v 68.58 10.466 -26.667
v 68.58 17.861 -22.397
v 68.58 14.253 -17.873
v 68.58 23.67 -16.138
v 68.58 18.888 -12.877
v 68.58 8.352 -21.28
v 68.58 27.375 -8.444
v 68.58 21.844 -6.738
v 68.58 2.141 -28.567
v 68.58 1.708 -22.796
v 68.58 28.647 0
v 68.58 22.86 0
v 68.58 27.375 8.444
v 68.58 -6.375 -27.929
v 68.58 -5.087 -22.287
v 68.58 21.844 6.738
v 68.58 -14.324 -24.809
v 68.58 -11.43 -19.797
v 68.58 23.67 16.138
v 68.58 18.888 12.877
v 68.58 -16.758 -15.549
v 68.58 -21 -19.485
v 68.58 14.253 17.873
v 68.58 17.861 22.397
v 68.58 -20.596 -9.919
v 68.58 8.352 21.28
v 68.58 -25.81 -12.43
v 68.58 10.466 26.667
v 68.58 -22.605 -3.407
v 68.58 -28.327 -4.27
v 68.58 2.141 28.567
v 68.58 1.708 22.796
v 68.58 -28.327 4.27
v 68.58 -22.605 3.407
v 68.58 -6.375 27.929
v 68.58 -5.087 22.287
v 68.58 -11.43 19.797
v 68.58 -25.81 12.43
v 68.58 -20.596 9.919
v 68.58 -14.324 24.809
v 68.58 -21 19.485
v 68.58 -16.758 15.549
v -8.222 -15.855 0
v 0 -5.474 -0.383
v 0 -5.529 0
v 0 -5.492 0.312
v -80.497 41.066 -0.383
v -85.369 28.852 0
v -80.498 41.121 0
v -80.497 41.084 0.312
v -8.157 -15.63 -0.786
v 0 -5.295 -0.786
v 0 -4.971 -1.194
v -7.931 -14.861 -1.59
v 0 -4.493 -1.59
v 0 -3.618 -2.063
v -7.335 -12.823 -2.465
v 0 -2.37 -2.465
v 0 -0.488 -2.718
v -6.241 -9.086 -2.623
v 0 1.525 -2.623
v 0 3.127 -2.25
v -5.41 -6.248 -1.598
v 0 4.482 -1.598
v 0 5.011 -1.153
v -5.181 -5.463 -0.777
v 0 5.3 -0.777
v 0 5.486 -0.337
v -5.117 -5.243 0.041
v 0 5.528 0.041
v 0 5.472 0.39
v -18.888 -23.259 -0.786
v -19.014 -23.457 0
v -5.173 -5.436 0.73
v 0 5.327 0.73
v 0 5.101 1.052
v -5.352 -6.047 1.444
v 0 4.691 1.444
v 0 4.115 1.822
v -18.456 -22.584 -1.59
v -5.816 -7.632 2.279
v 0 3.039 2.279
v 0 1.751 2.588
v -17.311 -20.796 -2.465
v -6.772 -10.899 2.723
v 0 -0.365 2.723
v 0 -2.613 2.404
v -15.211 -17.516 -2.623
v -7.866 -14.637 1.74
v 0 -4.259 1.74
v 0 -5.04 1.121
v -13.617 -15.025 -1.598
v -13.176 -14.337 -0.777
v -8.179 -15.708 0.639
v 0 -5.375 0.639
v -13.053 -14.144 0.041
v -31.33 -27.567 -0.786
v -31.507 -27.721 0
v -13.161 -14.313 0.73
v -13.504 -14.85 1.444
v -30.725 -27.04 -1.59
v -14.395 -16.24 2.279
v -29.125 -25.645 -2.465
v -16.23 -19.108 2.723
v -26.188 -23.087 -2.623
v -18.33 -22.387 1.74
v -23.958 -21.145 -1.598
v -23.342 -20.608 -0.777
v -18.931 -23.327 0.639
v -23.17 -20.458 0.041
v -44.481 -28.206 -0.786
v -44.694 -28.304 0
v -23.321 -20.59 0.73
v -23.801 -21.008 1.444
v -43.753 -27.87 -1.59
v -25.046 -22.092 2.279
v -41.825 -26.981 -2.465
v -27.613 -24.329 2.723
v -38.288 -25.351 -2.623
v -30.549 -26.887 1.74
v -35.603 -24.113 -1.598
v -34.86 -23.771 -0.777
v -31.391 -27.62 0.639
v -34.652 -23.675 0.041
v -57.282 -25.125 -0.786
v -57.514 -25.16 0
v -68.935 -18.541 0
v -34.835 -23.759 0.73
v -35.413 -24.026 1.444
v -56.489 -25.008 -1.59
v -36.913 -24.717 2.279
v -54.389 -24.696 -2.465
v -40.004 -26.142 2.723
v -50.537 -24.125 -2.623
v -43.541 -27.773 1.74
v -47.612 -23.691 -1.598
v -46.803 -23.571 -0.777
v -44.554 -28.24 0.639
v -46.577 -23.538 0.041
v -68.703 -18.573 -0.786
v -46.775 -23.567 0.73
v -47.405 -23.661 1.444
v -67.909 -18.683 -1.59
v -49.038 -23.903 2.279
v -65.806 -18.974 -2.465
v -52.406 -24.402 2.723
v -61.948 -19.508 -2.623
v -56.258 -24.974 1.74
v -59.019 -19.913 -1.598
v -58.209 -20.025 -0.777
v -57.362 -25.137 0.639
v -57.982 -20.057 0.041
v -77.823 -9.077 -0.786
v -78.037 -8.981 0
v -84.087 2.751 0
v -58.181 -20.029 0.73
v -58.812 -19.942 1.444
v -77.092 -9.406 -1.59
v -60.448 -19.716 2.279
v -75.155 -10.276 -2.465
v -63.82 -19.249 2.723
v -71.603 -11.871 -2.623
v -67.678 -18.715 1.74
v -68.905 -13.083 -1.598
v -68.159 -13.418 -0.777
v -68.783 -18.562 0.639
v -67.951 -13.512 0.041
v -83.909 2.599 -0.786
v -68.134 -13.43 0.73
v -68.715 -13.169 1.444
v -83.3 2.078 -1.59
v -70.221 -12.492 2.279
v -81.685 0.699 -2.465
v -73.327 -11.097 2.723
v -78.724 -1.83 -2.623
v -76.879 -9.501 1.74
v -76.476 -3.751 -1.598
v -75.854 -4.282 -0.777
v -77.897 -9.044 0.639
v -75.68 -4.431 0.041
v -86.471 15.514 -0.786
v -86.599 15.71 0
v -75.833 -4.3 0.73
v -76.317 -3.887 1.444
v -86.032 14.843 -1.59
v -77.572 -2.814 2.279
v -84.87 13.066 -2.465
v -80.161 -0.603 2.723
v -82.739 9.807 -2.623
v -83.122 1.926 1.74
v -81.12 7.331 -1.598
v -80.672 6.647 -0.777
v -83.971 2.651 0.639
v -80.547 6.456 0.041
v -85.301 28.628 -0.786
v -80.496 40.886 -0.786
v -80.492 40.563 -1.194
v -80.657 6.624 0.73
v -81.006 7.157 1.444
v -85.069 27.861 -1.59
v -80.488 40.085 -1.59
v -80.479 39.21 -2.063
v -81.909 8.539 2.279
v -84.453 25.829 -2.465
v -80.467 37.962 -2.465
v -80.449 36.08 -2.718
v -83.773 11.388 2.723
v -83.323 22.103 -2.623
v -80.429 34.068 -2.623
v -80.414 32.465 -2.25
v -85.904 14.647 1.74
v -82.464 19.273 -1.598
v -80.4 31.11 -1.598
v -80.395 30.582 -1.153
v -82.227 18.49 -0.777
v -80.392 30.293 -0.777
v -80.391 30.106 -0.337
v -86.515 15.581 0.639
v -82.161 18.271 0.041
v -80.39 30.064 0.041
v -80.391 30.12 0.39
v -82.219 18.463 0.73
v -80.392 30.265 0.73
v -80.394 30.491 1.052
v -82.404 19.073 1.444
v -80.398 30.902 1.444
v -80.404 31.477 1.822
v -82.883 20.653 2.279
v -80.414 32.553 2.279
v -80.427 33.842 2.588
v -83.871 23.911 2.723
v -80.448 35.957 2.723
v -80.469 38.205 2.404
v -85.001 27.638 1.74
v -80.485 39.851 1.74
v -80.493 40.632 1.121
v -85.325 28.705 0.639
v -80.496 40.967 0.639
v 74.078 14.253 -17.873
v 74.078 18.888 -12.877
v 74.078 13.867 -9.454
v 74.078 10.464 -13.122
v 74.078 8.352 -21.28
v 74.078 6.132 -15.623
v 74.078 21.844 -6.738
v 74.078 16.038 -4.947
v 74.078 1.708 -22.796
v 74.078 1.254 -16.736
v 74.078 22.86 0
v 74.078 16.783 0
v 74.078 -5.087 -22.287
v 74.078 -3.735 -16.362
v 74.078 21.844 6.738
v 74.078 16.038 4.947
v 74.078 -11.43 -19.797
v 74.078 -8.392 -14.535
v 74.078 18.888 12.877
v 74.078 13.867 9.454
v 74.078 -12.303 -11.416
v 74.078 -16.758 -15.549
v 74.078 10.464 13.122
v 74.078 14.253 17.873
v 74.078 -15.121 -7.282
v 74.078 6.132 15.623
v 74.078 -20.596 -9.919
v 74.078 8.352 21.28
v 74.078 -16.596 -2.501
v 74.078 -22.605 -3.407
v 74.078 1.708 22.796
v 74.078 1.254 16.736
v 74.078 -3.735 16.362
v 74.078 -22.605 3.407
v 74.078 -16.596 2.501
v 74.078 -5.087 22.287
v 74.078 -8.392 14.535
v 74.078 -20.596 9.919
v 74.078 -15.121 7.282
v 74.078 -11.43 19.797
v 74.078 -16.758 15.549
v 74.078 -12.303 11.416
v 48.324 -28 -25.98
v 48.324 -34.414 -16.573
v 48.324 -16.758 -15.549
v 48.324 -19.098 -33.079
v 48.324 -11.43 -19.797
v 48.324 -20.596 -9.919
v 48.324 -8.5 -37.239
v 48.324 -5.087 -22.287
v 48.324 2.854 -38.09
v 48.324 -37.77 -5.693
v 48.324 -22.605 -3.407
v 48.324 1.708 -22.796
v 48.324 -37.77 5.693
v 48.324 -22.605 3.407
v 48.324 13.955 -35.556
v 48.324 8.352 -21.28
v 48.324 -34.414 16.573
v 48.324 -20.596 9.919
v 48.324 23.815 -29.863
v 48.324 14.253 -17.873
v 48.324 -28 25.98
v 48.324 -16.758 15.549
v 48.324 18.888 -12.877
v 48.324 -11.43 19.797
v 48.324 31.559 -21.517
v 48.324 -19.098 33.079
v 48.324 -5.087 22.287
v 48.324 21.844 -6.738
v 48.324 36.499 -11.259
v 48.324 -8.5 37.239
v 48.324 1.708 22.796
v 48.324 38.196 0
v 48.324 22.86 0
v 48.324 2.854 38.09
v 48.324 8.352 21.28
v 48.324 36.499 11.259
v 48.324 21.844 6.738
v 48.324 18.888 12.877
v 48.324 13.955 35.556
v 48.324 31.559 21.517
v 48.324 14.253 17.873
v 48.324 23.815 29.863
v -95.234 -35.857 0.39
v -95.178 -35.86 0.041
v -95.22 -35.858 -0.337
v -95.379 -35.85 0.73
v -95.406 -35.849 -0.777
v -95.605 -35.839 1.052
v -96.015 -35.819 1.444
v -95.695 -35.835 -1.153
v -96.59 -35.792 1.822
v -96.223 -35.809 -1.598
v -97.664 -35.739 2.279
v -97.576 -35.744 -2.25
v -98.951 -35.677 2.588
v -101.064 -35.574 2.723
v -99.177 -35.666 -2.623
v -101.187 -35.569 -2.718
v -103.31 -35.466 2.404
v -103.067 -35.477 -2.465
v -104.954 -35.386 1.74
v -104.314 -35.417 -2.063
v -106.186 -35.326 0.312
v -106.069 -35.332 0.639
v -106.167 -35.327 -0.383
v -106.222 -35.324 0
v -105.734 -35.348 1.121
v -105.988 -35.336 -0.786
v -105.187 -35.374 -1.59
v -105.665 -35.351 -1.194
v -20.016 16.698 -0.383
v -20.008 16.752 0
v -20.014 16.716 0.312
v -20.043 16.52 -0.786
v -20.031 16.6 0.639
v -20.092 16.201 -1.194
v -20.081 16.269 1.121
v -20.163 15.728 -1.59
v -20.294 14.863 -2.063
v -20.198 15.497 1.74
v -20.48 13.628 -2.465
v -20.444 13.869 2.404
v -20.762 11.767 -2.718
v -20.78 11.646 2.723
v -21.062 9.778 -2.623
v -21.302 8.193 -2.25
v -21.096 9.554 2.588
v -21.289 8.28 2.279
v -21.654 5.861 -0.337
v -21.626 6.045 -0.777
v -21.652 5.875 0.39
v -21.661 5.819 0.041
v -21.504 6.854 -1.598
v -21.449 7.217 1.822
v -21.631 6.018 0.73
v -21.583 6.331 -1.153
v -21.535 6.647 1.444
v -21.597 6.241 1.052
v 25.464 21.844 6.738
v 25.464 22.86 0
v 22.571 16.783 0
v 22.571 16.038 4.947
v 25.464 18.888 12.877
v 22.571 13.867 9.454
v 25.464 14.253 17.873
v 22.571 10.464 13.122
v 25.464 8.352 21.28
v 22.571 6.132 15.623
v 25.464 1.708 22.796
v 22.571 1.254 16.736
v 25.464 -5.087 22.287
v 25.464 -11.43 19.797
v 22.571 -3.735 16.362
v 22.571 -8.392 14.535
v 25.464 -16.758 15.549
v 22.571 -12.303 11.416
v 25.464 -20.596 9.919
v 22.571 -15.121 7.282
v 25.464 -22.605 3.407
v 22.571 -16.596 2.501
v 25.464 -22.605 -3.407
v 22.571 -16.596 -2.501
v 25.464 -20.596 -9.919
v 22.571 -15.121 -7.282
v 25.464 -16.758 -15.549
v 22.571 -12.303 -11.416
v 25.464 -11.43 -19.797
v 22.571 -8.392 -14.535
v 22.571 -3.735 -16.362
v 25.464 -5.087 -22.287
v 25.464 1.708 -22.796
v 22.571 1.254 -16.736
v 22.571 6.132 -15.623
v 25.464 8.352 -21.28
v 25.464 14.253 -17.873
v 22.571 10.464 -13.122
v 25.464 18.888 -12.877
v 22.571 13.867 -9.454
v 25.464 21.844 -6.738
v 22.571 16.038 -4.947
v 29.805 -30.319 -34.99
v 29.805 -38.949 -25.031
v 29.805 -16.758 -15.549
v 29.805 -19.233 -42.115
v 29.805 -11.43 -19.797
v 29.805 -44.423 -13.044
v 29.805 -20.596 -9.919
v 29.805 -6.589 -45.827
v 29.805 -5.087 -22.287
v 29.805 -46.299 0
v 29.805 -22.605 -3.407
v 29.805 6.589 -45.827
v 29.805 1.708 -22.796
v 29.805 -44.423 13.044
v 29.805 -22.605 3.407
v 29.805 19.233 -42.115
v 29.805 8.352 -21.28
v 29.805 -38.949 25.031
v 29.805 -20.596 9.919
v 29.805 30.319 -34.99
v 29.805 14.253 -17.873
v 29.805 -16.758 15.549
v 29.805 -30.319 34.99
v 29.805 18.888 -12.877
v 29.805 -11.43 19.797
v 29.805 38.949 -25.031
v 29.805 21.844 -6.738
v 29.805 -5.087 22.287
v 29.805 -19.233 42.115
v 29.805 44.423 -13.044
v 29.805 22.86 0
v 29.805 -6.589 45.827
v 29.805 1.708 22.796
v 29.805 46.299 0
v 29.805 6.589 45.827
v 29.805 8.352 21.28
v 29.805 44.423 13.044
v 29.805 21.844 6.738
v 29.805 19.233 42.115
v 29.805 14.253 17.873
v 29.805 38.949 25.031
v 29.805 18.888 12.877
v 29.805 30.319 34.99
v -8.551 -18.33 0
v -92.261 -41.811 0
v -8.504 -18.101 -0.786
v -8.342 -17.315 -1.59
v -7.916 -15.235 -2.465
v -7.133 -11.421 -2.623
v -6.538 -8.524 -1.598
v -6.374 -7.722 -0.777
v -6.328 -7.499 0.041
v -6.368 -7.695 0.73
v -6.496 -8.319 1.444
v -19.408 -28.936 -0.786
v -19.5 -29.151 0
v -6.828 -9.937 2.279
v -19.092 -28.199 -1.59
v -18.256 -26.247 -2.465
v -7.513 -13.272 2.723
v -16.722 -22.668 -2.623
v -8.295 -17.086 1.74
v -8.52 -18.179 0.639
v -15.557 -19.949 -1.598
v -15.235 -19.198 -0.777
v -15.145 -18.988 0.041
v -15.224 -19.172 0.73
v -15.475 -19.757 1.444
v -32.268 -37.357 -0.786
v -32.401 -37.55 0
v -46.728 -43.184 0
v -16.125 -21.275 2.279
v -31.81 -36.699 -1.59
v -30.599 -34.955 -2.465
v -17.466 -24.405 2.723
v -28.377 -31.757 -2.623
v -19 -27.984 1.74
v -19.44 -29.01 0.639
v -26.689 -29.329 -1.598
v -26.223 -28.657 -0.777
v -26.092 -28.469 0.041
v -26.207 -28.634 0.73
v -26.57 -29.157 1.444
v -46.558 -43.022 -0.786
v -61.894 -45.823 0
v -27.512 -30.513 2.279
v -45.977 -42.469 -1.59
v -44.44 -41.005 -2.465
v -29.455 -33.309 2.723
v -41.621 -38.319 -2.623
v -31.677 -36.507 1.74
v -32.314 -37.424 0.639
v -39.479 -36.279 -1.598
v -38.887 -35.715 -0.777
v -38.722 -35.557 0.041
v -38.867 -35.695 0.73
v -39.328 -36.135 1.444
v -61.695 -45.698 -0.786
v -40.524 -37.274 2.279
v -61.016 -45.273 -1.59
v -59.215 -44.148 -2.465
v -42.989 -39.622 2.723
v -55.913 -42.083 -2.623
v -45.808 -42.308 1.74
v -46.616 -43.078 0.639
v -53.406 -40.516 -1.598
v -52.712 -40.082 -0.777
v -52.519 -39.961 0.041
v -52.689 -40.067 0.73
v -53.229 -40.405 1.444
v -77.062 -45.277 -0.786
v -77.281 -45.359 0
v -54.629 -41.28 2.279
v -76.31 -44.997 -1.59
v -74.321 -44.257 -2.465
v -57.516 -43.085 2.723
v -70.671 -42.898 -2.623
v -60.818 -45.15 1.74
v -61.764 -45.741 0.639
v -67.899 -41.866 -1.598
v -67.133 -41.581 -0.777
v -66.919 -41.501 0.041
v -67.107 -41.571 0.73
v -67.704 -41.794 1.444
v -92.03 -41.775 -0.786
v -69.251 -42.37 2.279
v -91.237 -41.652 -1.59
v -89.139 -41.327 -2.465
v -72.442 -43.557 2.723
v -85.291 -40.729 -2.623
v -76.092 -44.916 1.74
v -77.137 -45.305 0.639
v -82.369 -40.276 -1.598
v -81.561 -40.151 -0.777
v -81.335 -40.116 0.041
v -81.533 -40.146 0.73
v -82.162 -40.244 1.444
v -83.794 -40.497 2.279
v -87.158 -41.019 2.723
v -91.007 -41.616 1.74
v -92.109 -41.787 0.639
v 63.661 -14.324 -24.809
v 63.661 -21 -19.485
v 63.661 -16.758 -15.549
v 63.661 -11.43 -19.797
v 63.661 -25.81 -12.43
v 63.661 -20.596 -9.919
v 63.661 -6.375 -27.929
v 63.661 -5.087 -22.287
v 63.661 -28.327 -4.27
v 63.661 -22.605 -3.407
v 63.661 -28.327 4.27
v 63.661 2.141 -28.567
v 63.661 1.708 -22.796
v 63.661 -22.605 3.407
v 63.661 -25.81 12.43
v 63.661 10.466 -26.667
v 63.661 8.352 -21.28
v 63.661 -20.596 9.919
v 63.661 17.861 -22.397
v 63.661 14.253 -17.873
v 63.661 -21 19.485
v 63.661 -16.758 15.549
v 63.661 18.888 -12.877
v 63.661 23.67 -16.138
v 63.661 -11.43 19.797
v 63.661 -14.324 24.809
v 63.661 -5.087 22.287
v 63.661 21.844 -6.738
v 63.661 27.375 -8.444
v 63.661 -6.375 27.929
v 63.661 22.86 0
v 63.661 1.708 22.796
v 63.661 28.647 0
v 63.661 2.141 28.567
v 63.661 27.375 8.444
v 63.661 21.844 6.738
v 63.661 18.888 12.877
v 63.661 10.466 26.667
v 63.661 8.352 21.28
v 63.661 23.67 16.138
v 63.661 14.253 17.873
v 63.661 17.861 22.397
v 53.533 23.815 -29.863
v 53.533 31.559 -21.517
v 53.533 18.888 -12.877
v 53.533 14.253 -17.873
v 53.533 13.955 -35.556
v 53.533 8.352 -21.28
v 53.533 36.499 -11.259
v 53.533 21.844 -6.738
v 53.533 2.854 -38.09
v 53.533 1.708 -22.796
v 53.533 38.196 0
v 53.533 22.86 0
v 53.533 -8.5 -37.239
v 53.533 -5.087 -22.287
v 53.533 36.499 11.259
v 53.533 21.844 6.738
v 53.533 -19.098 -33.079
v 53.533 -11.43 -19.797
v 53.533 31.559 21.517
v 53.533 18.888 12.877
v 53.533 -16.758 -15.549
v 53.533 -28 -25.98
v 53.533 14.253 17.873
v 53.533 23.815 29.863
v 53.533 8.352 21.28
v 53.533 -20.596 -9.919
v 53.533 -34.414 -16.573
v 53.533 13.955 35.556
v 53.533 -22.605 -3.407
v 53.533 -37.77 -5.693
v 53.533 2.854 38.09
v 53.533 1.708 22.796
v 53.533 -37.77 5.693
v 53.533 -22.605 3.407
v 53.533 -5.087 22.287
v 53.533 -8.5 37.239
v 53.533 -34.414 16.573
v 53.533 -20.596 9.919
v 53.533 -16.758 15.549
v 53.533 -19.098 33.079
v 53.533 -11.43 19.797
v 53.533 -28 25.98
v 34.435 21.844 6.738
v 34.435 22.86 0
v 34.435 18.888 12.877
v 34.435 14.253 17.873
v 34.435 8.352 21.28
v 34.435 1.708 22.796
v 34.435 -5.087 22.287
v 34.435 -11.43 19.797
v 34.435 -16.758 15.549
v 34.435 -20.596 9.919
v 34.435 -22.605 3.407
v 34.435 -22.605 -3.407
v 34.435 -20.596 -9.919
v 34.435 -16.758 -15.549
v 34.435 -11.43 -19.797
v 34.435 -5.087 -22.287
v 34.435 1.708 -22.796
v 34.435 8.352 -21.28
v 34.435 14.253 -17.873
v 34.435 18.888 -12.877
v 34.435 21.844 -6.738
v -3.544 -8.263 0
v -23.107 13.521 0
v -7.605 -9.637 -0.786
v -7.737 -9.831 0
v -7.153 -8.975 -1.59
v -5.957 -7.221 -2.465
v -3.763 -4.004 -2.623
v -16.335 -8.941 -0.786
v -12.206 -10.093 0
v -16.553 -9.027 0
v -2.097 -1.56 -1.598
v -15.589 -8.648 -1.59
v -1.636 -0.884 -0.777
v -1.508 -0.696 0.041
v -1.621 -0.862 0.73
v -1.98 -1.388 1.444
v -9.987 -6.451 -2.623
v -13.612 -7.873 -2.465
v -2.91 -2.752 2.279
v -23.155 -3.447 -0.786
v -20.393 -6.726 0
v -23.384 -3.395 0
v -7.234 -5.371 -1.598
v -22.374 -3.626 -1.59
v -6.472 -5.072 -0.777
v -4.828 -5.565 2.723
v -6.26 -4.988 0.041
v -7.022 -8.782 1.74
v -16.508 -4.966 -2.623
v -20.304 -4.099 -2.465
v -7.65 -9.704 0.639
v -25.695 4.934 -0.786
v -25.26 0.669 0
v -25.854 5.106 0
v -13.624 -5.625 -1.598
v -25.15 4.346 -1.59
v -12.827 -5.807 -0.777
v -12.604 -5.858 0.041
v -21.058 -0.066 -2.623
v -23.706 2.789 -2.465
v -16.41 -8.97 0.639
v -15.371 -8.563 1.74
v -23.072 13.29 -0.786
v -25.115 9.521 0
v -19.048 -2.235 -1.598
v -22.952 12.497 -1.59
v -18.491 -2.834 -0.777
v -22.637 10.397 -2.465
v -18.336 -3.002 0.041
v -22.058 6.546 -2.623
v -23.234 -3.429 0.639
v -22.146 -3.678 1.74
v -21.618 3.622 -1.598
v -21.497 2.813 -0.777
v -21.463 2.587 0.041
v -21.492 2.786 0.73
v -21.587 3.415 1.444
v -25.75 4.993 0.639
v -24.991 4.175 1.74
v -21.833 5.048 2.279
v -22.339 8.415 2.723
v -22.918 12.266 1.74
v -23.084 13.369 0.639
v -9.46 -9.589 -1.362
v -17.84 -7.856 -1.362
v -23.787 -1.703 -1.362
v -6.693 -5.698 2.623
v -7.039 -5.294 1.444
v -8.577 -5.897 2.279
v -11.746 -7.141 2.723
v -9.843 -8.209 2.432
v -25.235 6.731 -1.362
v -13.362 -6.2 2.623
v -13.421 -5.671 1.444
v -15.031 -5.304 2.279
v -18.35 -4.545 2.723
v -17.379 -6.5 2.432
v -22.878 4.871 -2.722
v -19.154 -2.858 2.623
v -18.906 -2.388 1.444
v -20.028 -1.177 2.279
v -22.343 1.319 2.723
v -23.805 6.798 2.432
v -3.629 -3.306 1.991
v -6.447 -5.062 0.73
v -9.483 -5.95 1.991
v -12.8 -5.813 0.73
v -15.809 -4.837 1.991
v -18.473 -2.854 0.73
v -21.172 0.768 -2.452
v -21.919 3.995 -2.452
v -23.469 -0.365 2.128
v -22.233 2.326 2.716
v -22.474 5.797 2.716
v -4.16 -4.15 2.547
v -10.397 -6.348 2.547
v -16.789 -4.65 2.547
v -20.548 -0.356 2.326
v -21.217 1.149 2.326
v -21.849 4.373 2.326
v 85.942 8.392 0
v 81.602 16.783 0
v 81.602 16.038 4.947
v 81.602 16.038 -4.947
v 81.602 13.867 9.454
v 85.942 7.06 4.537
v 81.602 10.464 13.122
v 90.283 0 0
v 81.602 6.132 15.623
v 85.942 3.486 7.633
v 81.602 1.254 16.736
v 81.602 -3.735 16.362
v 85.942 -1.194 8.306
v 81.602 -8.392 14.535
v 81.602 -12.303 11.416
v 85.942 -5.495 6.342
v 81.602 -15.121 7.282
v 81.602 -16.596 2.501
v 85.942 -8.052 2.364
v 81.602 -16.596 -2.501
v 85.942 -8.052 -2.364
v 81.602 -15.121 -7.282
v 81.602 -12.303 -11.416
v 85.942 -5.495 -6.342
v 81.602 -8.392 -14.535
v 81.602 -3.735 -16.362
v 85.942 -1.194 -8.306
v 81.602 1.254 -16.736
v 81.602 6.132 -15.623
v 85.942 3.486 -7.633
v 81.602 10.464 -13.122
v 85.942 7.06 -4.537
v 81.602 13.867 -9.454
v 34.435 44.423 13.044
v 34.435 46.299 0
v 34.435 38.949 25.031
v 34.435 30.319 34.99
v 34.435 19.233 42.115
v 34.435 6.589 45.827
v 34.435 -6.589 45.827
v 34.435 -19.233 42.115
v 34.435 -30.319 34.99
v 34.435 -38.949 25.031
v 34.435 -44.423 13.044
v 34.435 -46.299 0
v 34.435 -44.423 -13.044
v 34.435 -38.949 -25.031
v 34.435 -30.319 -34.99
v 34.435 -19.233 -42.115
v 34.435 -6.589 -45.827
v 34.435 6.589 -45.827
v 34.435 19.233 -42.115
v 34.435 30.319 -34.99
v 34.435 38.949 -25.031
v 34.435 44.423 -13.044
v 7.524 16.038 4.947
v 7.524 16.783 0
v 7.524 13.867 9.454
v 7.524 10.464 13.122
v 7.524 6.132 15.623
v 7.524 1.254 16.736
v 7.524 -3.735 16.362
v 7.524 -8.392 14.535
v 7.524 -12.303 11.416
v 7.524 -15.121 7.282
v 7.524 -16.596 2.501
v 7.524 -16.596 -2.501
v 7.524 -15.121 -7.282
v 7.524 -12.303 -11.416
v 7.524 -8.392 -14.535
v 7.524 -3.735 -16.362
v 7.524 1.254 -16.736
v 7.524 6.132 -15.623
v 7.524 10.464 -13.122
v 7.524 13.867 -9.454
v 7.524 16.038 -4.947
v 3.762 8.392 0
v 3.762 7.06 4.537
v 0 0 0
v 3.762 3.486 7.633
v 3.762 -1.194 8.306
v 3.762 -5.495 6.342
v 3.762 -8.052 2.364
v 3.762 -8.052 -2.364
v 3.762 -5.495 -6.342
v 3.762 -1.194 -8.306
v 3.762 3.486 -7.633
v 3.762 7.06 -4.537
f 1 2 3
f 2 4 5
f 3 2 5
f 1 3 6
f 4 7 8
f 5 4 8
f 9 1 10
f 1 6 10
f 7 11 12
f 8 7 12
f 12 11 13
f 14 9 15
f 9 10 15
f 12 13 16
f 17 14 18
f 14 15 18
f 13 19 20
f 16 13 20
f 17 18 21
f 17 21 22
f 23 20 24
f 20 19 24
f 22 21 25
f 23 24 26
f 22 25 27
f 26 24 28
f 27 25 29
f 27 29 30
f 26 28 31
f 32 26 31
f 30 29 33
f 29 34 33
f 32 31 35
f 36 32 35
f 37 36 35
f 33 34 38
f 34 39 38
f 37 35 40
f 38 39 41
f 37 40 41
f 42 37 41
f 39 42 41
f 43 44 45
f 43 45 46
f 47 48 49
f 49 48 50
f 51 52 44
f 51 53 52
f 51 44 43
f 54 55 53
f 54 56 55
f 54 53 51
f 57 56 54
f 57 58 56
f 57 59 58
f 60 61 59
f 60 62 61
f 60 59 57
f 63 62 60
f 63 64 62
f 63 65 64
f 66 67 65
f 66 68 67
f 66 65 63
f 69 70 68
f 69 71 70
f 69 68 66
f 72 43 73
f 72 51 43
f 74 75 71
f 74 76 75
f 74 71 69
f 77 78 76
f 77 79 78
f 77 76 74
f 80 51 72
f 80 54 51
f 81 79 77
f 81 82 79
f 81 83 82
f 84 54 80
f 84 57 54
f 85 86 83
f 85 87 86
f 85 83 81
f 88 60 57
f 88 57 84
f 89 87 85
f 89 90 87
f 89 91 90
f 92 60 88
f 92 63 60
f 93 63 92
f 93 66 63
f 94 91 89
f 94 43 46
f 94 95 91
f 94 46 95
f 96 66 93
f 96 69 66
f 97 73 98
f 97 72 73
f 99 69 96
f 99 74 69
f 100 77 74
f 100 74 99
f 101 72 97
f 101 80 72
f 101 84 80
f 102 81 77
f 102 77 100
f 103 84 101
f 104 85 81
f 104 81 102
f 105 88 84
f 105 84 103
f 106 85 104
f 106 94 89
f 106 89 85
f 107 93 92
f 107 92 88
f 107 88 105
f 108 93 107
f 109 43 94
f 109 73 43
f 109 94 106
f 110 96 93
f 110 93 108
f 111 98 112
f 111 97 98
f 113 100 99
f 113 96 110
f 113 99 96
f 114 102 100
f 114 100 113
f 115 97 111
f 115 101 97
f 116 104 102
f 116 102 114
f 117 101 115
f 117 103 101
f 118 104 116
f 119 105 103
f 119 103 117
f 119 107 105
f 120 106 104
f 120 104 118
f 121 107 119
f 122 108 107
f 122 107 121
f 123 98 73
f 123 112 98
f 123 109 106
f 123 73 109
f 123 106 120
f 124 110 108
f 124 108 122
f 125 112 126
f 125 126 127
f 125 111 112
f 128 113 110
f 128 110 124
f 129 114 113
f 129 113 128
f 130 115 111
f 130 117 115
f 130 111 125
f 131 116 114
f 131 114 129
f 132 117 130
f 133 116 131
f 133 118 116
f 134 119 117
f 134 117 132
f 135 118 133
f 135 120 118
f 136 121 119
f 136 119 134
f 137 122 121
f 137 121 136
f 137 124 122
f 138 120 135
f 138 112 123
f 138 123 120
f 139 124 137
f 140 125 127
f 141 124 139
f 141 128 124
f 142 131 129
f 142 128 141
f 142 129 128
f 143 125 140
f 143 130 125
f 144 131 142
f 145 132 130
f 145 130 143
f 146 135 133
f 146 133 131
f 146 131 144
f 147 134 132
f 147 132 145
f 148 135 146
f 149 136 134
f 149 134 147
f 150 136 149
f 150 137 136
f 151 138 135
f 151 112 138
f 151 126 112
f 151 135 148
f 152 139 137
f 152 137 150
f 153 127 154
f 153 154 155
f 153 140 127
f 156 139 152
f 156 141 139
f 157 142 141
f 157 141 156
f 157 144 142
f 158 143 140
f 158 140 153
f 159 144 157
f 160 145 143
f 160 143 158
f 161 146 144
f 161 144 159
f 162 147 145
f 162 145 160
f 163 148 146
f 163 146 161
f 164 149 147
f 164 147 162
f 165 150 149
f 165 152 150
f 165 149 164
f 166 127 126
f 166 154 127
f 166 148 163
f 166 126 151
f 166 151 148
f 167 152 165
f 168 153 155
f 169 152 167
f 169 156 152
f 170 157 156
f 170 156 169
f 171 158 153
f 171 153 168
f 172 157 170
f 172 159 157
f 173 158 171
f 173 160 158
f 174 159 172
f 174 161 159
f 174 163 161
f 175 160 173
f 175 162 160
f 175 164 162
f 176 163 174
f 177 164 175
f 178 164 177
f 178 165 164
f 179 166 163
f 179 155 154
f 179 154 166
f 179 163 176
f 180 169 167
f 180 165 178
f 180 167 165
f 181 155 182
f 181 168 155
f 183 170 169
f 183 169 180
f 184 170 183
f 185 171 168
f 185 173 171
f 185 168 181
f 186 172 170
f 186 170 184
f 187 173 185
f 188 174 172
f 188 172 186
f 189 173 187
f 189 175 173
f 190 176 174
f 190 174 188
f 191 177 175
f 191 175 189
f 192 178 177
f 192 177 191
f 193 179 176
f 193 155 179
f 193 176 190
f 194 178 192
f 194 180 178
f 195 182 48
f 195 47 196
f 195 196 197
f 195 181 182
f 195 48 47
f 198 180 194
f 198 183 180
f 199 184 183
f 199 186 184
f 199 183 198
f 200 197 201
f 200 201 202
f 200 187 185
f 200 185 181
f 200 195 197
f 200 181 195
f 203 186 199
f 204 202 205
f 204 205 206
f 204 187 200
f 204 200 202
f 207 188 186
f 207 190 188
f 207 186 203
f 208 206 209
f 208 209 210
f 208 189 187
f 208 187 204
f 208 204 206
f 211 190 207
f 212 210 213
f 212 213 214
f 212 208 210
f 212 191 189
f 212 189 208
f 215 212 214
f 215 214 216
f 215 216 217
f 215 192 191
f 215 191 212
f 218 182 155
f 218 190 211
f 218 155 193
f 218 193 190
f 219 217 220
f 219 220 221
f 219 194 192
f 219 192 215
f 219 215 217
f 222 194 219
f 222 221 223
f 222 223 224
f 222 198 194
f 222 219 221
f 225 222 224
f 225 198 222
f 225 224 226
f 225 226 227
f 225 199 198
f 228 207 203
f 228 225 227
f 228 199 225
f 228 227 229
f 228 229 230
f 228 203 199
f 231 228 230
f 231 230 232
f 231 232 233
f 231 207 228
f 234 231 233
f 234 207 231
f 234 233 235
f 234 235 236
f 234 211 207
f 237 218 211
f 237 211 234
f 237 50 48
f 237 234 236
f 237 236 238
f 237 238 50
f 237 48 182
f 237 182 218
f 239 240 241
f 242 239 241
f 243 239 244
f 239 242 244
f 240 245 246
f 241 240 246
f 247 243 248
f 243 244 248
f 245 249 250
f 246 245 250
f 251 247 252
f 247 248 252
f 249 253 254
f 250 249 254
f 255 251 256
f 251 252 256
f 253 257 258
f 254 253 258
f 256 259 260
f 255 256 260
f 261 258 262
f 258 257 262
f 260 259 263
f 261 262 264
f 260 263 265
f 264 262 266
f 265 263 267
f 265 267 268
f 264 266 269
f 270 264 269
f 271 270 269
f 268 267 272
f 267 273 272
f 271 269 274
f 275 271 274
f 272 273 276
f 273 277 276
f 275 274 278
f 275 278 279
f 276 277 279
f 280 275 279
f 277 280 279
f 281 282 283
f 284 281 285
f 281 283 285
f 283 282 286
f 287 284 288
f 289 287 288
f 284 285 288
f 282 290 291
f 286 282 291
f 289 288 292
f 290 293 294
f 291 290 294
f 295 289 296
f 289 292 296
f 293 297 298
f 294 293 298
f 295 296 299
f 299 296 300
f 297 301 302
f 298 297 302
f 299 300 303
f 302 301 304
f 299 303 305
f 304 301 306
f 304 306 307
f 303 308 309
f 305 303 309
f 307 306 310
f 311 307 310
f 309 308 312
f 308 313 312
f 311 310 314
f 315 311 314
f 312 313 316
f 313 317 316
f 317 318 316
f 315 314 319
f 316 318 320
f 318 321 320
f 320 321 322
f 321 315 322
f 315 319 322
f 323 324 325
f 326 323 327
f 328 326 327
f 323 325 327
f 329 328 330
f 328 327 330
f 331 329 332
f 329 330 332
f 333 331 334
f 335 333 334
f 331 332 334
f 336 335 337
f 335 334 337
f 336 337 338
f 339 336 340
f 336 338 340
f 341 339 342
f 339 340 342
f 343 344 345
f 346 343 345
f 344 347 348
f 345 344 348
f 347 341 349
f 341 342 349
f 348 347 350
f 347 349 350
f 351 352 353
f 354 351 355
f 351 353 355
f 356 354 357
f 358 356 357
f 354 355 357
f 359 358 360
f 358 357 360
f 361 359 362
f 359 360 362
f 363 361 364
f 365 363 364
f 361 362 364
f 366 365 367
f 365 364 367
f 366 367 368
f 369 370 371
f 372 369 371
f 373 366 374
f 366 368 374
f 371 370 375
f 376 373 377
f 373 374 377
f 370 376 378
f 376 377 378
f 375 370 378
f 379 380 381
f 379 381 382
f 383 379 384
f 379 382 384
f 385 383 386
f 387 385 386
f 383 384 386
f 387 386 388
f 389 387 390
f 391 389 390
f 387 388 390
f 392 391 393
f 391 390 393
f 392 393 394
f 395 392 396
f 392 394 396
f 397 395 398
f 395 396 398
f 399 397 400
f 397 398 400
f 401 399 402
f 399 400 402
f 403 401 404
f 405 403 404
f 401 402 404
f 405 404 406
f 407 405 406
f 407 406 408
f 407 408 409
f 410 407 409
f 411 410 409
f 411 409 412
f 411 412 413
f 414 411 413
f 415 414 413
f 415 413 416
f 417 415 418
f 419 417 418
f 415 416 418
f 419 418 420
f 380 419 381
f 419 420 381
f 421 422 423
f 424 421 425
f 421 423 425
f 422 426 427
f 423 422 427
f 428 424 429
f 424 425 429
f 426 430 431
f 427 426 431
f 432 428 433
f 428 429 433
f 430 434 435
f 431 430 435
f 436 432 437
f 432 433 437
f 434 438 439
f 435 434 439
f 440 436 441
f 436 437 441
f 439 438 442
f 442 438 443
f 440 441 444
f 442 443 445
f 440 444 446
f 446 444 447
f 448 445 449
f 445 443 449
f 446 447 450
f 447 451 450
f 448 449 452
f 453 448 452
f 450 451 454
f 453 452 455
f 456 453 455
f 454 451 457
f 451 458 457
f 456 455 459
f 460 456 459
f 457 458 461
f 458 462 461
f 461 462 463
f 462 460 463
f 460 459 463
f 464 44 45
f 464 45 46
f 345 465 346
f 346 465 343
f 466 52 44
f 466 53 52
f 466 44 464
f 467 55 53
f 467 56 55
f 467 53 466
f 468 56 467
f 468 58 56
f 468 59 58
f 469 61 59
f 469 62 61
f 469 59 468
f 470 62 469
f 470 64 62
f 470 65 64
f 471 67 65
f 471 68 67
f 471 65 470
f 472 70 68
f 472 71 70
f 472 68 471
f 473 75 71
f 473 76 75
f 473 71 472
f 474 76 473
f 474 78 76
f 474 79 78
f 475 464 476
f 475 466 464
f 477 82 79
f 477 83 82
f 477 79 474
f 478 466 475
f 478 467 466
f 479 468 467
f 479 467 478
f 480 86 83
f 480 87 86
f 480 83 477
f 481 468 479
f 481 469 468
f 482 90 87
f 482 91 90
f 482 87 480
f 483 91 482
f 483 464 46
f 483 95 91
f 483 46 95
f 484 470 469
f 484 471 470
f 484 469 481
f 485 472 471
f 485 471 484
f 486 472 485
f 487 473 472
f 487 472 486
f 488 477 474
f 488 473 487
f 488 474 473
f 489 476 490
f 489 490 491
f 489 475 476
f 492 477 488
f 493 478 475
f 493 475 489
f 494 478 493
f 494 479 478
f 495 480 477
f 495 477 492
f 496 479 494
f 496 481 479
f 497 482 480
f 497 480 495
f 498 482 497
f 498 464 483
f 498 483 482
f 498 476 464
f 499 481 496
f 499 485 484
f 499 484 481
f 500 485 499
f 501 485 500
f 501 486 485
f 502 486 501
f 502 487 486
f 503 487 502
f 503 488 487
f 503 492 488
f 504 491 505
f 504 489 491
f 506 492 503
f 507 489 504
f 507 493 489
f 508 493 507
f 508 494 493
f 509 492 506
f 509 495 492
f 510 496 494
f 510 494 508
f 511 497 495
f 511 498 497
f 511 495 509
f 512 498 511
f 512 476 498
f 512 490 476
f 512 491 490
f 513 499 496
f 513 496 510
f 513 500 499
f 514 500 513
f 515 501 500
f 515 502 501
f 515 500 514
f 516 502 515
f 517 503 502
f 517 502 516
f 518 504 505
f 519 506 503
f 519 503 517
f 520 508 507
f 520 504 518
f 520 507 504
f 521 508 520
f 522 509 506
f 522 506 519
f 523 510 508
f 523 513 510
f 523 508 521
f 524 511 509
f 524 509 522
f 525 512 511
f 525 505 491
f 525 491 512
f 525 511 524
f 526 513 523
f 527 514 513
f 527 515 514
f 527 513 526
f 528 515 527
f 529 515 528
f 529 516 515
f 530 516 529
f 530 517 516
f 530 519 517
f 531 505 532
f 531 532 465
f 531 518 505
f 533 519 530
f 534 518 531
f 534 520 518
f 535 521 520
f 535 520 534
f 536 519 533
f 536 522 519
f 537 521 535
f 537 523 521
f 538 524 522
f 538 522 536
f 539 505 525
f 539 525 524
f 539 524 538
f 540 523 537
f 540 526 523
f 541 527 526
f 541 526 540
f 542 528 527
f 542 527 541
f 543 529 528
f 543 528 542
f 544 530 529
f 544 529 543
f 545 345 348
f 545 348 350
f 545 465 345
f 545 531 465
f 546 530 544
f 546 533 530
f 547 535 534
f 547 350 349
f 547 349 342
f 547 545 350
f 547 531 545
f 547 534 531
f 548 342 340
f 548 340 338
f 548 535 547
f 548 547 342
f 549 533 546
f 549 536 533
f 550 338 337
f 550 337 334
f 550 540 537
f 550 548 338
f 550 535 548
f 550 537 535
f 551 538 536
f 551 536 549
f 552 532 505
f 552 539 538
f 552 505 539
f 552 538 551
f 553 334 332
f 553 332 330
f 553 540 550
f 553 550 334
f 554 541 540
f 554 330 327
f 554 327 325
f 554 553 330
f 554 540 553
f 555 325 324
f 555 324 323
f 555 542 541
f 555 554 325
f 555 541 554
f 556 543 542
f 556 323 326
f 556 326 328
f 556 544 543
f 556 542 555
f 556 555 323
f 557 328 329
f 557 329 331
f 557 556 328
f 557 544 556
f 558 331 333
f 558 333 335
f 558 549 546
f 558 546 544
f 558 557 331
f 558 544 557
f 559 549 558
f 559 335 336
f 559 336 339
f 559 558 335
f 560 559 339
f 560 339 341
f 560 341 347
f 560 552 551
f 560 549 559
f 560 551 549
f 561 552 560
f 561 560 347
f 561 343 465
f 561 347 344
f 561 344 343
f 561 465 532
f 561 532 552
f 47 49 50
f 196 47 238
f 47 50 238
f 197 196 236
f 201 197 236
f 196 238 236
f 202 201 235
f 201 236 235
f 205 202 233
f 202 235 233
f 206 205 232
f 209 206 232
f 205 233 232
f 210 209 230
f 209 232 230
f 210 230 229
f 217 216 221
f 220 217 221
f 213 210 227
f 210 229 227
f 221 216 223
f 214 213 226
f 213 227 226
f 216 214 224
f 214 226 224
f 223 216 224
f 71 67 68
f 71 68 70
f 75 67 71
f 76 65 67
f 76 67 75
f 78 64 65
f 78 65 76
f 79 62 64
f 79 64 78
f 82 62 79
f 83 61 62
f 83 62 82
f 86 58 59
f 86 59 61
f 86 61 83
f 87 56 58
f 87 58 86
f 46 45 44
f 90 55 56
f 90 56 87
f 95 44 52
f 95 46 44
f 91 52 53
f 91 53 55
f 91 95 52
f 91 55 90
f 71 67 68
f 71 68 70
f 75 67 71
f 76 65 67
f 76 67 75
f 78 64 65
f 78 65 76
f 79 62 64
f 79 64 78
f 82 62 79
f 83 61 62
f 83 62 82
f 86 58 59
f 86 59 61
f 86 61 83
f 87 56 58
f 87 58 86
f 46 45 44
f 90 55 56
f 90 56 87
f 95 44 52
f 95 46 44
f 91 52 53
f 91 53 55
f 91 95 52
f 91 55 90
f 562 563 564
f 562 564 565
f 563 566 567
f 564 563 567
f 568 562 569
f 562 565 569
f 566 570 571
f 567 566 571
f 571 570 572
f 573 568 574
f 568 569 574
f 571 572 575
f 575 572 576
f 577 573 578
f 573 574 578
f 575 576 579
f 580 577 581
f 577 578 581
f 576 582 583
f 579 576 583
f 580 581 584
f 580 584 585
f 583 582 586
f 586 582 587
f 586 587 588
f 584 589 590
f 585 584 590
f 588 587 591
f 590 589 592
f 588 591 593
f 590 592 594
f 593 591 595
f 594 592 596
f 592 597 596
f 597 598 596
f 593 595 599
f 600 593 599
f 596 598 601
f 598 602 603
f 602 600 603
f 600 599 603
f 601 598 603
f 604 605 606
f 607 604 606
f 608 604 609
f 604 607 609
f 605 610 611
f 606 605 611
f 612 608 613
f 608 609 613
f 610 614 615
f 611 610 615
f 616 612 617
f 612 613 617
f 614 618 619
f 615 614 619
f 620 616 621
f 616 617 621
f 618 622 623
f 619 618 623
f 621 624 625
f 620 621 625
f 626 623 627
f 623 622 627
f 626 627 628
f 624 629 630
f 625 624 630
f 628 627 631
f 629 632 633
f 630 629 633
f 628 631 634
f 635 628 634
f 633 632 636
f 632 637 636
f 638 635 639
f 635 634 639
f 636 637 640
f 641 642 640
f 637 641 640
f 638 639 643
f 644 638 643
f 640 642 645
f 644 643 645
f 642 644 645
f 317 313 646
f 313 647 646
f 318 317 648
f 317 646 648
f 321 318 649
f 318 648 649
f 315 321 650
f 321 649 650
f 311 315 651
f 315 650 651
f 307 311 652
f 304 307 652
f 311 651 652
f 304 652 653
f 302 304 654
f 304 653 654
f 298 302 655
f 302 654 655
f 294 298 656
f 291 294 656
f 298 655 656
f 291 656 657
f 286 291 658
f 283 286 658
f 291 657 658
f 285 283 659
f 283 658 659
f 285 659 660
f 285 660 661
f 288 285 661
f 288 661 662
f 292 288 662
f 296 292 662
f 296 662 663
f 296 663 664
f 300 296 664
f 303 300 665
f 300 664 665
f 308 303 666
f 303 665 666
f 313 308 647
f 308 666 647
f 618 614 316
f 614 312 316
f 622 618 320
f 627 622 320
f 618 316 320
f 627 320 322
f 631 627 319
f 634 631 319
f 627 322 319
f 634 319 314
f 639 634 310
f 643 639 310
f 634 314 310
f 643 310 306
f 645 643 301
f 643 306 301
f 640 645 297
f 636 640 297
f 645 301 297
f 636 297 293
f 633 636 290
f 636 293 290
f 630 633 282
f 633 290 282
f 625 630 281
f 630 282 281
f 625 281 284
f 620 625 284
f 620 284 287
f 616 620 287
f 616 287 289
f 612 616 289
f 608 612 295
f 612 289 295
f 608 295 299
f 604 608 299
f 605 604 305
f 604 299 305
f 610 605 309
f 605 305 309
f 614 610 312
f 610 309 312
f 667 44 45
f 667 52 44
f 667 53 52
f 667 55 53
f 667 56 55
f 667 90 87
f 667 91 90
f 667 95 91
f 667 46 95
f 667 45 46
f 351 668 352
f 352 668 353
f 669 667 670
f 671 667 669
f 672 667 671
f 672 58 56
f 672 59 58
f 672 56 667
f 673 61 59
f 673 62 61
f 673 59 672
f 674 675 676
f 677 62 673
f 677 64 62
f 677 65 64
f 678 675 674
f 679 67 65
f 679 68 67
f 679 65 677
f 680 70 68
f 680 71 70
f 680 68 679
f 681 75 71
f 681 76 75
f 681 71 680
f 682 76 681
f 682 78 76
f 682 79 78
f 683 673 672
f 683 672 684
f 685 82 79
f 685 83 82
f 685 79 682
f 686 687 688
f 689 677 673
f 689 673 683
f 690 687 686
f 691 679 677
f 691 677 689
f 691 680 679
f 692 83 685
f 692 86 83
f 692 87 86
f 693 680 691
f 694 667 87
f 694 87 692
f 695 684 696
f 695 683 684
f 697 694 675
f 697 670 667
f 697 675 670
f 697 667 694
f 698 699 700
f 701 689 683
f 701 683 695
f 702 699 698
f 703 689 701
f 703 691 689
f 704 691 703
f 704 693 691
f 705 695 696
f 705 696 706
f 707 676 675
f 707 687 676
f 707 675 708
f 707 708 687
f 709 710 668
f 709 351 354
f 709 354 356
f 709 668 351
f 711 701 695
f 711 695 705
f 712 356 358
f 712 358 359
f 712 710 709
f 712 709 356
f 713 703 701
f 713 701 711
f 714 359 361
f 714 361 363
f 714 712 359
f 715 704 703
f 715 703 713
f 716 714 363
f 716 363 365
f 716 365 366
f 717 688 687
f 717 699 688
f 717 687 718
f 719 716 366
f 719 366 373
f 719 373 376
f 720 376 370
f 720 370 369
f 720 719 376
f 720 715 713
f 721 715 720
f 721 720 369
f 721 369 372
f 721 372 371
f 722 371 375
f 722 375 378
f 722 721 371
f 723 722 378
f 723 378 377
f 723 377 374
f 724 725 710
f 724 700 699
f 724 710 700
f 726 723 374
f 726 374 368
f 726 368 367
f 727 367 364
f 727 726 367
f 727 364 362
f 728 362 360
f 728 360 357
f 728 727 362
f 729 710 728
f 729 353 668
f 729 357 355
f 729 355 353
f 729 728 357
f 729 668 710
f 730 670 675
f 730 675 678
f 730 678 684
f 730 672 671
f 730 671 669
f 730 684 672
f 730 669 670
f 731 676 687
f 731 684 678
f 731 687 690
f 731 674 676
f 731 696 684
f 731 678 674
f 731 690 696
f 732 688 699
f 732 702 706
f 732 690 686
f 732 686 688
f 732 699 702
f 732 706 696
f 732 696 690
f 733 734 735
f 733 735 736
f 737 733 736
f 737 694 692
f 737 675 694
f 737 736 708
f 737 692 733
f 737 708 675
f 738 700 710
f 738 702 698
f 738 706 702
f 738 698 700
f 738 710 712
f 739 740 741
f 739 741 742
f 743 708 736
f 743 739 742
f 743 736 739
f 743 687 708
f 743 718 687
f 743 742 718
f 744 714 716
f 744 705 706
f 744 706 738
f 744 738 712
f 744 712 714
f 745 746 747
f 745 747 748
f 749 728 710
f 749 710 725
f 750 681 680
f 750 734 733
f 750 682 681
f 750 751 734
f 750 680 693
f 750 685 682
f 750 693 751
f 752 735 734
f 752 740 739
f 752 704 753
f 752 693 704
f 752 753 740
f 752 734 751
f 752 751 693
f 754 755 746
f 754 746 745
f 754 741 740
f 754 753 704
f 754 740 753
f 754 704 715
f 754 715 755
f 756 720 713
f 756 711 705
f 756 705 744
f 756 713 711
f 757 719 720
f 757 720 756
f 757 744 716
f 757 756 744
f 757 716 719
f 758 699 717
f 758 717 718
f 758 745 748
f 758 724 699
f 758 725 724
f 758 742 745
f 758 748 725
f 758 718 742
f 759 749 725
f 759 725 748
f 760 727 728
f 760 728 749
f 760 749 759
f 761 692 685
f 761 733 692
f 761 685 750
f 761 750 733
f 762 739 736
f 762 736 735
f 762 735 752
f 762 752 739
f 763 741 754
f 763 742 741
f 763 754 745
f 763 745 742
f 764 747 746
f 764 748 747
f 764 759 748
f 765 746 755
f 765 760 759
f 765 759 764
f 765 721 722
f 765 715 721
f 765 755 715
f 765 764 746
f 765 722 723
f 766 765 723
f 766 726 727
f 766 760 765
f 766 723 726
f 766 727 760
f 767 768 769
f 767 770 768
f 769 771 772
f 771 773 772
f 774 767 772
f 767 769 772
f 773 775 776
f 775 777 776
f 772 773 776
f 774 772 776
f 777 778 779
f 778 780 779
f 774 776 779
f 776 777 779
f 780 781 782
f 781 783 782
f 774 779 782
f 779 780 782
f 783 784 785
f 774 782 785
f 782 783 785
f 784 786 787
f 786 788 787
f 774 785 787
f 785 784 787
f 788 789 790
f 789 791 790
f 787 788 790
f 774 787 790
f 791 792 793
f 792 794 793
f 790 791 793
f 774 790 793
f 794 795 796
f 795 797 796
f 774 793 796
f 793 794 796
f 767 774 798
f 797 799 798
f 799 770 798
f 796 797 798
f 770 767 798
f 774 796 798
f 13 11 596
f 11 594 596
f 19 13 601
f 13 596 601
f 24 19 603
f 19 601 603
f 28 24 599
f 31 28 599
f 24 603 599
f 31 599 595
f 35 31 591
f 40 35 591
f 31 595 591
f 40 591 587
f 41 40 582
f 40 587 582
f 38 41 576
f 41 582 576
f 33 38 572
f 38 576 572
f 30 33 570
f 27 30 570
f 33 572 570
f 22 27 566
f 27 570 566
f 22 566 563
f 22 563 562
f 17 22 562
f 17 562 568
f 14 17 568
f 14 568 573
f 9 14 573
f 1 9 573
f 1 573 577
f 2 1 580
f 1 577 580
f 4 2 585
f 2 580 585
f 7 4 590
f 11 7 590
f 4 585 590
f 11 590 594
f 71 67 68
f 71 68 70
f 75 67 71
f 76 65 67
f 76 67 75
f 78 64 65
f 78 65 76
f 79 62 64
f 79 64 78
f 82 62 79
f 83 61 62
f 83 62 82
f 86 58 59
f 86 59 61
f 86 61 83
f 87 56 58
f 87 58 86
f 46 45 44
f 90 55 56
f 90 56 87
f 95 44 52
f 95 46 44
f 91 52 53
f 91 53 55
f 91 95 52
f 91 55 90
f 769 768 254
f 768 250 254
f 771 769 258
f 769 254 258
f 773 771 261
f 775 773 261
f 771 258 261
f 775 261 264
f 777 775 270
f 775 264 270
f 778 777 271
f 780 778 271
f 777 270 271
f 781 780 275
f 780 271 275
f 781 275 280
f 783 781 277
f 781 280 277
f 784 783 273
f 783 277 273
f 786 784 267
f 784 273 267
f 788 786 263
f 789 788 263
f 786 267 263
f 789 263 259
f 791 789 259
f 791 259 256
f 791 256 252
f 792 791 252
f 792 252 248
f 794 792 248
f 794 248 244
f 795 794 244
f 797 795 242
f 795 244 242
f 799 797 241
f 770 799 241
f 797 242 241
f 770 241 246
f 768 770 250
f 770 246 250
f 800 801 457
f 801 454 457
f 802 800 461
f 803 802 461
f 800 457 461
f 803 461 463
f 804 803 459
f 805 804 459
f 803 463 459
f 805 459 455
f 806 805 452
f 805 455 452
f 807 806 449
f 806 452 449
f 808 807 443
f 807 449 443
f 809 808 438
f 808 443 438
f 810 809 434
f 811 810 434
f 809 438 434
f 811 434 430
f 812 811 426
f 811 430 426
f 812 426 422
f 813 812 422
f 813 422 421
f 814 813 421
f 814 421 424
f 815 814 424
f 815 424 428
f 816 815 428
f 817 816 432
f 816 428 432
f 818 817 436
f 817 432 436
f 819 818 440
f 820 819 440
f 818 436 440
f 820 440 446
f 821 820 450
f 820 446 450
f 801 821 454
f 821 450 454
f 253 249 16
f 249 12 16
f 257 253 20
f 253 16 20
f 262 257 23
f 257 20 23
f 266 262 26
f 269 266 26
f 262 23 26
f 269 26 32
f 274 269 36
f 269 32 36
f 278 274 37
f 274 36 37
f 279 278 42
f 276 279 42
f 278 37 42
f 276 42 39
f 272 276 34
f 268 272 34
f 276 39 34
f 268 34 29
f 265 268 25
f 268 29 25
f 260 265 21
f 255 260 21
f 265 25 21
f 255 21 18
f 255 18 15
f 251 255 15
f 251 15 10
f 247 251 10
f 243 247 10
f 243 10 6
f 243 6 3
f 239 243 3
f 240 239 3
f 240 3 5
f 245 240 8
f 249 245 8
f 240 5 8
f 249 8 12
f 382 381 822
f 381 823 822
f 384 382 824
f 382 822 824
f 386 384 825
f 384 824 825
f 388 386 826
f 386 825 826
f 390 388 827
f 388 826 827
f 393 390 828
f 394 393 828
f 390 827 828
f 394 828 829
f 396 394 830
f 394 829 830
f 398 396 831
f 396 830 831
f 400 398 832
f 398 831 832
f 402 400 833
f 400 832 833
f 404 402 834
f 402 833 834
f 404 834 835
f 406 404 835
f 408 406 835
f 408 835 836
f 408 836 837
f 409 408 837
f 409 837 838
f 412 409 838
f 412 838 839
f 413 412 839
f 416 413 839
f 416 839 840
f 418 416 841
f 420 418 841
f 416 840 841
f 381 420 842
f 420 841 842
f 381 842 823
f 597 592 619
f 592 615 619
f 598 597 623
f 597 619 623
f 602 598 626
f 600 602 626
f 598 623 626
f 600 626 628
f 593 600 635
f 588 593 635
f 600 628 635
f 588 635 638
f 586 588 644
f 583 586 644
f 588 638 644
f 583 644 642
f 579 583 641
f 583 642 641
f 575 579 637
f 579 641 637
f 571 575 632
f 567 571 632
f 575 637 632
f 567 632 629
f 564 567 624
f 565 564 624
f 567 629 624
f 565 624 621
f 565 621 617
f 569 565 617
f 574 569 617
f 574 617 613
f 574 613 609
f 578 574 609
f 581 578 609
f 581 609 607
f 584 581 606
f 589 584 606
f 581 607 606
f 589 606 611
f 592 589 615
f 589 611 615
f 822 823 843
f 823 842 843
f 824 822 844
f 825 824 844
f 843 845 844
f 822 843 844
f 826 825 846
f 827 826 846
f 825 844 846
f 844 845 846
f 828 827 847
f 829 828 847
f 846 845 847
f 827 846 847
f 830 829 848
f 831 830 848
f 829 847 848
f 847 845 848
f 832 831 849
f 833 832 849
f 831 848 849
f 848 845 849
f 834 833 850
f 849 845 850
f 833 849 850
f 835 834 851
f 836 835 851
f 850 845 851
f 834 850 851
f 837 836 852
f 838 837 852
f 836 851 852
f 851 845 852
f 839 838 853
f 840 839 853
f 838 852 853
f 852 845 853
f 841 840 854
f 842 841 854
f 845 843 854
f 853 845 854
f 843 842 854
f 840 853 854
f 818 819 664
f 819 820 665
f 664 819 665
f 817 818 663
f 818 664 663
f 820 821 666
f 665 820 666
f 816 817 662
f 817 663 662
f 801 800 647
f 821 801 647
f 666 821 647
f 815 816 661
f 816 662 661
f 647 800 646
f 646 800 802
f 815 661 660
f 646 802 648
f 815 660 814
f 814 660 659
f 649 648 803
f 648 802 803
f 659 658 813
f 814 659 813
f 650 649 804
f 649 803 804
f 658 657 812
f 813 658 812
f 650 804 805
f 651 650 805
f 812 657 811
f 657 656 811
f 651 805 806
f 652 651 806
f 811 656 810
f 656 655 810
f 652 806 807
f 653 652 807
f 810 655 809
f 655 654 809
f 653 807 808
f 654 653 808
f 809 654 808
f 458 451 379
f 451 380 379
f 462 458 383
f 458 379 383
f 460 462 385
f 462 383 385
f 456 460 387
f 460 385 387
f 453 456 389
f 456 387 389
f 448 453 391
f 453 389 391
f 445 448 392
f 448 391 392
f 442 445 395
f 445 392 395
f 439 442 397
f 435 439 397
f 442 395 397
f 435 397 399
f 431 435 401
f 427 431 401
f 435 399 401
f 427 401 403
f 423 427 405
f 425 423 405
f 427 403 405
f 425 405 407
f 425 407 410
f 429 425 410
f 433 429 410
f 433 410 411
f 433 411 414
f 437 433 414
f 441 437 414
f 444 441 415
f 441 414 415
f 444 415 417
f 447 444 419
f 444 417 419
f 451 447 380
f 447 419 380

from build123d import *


with BuildPart() as f2:
    # F0 (on Top) → F2 (revolve)
    with BuildSketch(Plane.XY):
        Polygon((7.523543, 16.783291), (0, 0), (90.282537, 0), (81.601523, 16.783291), (74.077971, 16.783291), (74.077971, 22.860002), (68.580002, 22.860002), (68.580002, 28.647341), (63.660756, 28.647341), (63.660756, 22.860002), (53.532913, 22.860002), (53.532913, 38.196456), (48.324306, 38.196456), (48.324306, 22.860002), (34.43468, 22.860002), (34.43468, 46.298735), (29.804811, 46.298735), (29.804811, 22.860002), (25.464306, 22.860002), (22.570632, 16.783291), align=None)
    revolve(axis=Axis((45.141269, 0, 0), (1, 0, 0)))


with BuildPart() as f3:
    # F3: sweep along a path in F0
    with BuildLine(Plane.XY) as f3_path:
        ThreePointArc((0, 0), (-16.499797, -5.586724), (-20.834431, 11.285316))
    # F1 (on Right) → F3 (sweep)
    with BuildSketch(Plane.YZ):
        with BuildLine():
            add(Edge.make_bspline(
                [(-5.528776, 0), (-5.528776, -4.725975), (2.764388, -2.362988), (11.057552, 0), (2.764388, 2.362988), (-5.528776, 4.725975), (-5.528776, 0)],
                knots=[0, 0, 0, 2.094395, 2.094395, 4.18879, 4.18879, 6.283185, 6.283185, 6.283185], degree=2, weights=[1, 0.5, 1, 0.5, 1, 0.5, 1]))
        make_face()
    sweep(path=f3_path.line)


with BuildPart() as f4:
    # F4: sweep along a path in F0
    with BuildLine(Plane.XY) as f4_path:
        ThreePointArc((0, 0), (-57.931739, -22.230751), (-80.444053, 35.592154))
    # F3_face (on face) → F4 (sweep)
    with BuildSketch(Plane(origin=(0, 0.01341, 0), x_dir=(0, 1, 0), z_dir=(1, 0, 0))):
        with BuildLine():
            add(Edge.make_bspline(
                [(-5.542186, 0), (-5.542186, -4.725975), (2.750978, -2.362988), (11.044142, 0), (2.750978, 2.362988), (-5.542186, 4.725975), (-5.542186, 0)],
                knots=[0, 0, 0, 2.094395, 2.094395, 4.18879, 4.18879, 6.283185, 6.283185, 6.283185], degree=2, weights=[1, 0.5, 1, 0.5, 1, 0.5, 1]))
        make_face()
    sweep(path=f4_path.line)


with BuildPart() as f5:
    # F5: sweep along a path in F0
    with BuildLine(Plane.XY) as f5_path:
        ThreePointArc((0, 0), (-42.724561, -39.370127), (-100.699745, -35.592154))
    # F3_face (on face) → F5 (sweep)
    with BuildSketch(Plane(origin=(0, 0.01341, 0), x_dir=(0, 1, 0), z_dir=(1, 0, 0))):
        with BuildLine():
            add(Edge.make_bspline(
                [(-5.542186, 0), (-5.542186, -4.725975), (2.750978, -2.362988), (11.044142, 0), (2.750978, 2.362988), (-5.542186, 4.725975), (-5.542186, 0)],
                knots=[0, 0, 0, 2.094395, 2.094395, 4.18879, 4.18879, 6.283185, 6.283185, 6.283185], degree=2, weights=[1, 0.5, 1, 0.5, 1, 0.5, 1]))
        make_face()
    sweep(path=f5_path.line)


solid = Compound([f2.part, f3.part, f4.part, f5.part])
